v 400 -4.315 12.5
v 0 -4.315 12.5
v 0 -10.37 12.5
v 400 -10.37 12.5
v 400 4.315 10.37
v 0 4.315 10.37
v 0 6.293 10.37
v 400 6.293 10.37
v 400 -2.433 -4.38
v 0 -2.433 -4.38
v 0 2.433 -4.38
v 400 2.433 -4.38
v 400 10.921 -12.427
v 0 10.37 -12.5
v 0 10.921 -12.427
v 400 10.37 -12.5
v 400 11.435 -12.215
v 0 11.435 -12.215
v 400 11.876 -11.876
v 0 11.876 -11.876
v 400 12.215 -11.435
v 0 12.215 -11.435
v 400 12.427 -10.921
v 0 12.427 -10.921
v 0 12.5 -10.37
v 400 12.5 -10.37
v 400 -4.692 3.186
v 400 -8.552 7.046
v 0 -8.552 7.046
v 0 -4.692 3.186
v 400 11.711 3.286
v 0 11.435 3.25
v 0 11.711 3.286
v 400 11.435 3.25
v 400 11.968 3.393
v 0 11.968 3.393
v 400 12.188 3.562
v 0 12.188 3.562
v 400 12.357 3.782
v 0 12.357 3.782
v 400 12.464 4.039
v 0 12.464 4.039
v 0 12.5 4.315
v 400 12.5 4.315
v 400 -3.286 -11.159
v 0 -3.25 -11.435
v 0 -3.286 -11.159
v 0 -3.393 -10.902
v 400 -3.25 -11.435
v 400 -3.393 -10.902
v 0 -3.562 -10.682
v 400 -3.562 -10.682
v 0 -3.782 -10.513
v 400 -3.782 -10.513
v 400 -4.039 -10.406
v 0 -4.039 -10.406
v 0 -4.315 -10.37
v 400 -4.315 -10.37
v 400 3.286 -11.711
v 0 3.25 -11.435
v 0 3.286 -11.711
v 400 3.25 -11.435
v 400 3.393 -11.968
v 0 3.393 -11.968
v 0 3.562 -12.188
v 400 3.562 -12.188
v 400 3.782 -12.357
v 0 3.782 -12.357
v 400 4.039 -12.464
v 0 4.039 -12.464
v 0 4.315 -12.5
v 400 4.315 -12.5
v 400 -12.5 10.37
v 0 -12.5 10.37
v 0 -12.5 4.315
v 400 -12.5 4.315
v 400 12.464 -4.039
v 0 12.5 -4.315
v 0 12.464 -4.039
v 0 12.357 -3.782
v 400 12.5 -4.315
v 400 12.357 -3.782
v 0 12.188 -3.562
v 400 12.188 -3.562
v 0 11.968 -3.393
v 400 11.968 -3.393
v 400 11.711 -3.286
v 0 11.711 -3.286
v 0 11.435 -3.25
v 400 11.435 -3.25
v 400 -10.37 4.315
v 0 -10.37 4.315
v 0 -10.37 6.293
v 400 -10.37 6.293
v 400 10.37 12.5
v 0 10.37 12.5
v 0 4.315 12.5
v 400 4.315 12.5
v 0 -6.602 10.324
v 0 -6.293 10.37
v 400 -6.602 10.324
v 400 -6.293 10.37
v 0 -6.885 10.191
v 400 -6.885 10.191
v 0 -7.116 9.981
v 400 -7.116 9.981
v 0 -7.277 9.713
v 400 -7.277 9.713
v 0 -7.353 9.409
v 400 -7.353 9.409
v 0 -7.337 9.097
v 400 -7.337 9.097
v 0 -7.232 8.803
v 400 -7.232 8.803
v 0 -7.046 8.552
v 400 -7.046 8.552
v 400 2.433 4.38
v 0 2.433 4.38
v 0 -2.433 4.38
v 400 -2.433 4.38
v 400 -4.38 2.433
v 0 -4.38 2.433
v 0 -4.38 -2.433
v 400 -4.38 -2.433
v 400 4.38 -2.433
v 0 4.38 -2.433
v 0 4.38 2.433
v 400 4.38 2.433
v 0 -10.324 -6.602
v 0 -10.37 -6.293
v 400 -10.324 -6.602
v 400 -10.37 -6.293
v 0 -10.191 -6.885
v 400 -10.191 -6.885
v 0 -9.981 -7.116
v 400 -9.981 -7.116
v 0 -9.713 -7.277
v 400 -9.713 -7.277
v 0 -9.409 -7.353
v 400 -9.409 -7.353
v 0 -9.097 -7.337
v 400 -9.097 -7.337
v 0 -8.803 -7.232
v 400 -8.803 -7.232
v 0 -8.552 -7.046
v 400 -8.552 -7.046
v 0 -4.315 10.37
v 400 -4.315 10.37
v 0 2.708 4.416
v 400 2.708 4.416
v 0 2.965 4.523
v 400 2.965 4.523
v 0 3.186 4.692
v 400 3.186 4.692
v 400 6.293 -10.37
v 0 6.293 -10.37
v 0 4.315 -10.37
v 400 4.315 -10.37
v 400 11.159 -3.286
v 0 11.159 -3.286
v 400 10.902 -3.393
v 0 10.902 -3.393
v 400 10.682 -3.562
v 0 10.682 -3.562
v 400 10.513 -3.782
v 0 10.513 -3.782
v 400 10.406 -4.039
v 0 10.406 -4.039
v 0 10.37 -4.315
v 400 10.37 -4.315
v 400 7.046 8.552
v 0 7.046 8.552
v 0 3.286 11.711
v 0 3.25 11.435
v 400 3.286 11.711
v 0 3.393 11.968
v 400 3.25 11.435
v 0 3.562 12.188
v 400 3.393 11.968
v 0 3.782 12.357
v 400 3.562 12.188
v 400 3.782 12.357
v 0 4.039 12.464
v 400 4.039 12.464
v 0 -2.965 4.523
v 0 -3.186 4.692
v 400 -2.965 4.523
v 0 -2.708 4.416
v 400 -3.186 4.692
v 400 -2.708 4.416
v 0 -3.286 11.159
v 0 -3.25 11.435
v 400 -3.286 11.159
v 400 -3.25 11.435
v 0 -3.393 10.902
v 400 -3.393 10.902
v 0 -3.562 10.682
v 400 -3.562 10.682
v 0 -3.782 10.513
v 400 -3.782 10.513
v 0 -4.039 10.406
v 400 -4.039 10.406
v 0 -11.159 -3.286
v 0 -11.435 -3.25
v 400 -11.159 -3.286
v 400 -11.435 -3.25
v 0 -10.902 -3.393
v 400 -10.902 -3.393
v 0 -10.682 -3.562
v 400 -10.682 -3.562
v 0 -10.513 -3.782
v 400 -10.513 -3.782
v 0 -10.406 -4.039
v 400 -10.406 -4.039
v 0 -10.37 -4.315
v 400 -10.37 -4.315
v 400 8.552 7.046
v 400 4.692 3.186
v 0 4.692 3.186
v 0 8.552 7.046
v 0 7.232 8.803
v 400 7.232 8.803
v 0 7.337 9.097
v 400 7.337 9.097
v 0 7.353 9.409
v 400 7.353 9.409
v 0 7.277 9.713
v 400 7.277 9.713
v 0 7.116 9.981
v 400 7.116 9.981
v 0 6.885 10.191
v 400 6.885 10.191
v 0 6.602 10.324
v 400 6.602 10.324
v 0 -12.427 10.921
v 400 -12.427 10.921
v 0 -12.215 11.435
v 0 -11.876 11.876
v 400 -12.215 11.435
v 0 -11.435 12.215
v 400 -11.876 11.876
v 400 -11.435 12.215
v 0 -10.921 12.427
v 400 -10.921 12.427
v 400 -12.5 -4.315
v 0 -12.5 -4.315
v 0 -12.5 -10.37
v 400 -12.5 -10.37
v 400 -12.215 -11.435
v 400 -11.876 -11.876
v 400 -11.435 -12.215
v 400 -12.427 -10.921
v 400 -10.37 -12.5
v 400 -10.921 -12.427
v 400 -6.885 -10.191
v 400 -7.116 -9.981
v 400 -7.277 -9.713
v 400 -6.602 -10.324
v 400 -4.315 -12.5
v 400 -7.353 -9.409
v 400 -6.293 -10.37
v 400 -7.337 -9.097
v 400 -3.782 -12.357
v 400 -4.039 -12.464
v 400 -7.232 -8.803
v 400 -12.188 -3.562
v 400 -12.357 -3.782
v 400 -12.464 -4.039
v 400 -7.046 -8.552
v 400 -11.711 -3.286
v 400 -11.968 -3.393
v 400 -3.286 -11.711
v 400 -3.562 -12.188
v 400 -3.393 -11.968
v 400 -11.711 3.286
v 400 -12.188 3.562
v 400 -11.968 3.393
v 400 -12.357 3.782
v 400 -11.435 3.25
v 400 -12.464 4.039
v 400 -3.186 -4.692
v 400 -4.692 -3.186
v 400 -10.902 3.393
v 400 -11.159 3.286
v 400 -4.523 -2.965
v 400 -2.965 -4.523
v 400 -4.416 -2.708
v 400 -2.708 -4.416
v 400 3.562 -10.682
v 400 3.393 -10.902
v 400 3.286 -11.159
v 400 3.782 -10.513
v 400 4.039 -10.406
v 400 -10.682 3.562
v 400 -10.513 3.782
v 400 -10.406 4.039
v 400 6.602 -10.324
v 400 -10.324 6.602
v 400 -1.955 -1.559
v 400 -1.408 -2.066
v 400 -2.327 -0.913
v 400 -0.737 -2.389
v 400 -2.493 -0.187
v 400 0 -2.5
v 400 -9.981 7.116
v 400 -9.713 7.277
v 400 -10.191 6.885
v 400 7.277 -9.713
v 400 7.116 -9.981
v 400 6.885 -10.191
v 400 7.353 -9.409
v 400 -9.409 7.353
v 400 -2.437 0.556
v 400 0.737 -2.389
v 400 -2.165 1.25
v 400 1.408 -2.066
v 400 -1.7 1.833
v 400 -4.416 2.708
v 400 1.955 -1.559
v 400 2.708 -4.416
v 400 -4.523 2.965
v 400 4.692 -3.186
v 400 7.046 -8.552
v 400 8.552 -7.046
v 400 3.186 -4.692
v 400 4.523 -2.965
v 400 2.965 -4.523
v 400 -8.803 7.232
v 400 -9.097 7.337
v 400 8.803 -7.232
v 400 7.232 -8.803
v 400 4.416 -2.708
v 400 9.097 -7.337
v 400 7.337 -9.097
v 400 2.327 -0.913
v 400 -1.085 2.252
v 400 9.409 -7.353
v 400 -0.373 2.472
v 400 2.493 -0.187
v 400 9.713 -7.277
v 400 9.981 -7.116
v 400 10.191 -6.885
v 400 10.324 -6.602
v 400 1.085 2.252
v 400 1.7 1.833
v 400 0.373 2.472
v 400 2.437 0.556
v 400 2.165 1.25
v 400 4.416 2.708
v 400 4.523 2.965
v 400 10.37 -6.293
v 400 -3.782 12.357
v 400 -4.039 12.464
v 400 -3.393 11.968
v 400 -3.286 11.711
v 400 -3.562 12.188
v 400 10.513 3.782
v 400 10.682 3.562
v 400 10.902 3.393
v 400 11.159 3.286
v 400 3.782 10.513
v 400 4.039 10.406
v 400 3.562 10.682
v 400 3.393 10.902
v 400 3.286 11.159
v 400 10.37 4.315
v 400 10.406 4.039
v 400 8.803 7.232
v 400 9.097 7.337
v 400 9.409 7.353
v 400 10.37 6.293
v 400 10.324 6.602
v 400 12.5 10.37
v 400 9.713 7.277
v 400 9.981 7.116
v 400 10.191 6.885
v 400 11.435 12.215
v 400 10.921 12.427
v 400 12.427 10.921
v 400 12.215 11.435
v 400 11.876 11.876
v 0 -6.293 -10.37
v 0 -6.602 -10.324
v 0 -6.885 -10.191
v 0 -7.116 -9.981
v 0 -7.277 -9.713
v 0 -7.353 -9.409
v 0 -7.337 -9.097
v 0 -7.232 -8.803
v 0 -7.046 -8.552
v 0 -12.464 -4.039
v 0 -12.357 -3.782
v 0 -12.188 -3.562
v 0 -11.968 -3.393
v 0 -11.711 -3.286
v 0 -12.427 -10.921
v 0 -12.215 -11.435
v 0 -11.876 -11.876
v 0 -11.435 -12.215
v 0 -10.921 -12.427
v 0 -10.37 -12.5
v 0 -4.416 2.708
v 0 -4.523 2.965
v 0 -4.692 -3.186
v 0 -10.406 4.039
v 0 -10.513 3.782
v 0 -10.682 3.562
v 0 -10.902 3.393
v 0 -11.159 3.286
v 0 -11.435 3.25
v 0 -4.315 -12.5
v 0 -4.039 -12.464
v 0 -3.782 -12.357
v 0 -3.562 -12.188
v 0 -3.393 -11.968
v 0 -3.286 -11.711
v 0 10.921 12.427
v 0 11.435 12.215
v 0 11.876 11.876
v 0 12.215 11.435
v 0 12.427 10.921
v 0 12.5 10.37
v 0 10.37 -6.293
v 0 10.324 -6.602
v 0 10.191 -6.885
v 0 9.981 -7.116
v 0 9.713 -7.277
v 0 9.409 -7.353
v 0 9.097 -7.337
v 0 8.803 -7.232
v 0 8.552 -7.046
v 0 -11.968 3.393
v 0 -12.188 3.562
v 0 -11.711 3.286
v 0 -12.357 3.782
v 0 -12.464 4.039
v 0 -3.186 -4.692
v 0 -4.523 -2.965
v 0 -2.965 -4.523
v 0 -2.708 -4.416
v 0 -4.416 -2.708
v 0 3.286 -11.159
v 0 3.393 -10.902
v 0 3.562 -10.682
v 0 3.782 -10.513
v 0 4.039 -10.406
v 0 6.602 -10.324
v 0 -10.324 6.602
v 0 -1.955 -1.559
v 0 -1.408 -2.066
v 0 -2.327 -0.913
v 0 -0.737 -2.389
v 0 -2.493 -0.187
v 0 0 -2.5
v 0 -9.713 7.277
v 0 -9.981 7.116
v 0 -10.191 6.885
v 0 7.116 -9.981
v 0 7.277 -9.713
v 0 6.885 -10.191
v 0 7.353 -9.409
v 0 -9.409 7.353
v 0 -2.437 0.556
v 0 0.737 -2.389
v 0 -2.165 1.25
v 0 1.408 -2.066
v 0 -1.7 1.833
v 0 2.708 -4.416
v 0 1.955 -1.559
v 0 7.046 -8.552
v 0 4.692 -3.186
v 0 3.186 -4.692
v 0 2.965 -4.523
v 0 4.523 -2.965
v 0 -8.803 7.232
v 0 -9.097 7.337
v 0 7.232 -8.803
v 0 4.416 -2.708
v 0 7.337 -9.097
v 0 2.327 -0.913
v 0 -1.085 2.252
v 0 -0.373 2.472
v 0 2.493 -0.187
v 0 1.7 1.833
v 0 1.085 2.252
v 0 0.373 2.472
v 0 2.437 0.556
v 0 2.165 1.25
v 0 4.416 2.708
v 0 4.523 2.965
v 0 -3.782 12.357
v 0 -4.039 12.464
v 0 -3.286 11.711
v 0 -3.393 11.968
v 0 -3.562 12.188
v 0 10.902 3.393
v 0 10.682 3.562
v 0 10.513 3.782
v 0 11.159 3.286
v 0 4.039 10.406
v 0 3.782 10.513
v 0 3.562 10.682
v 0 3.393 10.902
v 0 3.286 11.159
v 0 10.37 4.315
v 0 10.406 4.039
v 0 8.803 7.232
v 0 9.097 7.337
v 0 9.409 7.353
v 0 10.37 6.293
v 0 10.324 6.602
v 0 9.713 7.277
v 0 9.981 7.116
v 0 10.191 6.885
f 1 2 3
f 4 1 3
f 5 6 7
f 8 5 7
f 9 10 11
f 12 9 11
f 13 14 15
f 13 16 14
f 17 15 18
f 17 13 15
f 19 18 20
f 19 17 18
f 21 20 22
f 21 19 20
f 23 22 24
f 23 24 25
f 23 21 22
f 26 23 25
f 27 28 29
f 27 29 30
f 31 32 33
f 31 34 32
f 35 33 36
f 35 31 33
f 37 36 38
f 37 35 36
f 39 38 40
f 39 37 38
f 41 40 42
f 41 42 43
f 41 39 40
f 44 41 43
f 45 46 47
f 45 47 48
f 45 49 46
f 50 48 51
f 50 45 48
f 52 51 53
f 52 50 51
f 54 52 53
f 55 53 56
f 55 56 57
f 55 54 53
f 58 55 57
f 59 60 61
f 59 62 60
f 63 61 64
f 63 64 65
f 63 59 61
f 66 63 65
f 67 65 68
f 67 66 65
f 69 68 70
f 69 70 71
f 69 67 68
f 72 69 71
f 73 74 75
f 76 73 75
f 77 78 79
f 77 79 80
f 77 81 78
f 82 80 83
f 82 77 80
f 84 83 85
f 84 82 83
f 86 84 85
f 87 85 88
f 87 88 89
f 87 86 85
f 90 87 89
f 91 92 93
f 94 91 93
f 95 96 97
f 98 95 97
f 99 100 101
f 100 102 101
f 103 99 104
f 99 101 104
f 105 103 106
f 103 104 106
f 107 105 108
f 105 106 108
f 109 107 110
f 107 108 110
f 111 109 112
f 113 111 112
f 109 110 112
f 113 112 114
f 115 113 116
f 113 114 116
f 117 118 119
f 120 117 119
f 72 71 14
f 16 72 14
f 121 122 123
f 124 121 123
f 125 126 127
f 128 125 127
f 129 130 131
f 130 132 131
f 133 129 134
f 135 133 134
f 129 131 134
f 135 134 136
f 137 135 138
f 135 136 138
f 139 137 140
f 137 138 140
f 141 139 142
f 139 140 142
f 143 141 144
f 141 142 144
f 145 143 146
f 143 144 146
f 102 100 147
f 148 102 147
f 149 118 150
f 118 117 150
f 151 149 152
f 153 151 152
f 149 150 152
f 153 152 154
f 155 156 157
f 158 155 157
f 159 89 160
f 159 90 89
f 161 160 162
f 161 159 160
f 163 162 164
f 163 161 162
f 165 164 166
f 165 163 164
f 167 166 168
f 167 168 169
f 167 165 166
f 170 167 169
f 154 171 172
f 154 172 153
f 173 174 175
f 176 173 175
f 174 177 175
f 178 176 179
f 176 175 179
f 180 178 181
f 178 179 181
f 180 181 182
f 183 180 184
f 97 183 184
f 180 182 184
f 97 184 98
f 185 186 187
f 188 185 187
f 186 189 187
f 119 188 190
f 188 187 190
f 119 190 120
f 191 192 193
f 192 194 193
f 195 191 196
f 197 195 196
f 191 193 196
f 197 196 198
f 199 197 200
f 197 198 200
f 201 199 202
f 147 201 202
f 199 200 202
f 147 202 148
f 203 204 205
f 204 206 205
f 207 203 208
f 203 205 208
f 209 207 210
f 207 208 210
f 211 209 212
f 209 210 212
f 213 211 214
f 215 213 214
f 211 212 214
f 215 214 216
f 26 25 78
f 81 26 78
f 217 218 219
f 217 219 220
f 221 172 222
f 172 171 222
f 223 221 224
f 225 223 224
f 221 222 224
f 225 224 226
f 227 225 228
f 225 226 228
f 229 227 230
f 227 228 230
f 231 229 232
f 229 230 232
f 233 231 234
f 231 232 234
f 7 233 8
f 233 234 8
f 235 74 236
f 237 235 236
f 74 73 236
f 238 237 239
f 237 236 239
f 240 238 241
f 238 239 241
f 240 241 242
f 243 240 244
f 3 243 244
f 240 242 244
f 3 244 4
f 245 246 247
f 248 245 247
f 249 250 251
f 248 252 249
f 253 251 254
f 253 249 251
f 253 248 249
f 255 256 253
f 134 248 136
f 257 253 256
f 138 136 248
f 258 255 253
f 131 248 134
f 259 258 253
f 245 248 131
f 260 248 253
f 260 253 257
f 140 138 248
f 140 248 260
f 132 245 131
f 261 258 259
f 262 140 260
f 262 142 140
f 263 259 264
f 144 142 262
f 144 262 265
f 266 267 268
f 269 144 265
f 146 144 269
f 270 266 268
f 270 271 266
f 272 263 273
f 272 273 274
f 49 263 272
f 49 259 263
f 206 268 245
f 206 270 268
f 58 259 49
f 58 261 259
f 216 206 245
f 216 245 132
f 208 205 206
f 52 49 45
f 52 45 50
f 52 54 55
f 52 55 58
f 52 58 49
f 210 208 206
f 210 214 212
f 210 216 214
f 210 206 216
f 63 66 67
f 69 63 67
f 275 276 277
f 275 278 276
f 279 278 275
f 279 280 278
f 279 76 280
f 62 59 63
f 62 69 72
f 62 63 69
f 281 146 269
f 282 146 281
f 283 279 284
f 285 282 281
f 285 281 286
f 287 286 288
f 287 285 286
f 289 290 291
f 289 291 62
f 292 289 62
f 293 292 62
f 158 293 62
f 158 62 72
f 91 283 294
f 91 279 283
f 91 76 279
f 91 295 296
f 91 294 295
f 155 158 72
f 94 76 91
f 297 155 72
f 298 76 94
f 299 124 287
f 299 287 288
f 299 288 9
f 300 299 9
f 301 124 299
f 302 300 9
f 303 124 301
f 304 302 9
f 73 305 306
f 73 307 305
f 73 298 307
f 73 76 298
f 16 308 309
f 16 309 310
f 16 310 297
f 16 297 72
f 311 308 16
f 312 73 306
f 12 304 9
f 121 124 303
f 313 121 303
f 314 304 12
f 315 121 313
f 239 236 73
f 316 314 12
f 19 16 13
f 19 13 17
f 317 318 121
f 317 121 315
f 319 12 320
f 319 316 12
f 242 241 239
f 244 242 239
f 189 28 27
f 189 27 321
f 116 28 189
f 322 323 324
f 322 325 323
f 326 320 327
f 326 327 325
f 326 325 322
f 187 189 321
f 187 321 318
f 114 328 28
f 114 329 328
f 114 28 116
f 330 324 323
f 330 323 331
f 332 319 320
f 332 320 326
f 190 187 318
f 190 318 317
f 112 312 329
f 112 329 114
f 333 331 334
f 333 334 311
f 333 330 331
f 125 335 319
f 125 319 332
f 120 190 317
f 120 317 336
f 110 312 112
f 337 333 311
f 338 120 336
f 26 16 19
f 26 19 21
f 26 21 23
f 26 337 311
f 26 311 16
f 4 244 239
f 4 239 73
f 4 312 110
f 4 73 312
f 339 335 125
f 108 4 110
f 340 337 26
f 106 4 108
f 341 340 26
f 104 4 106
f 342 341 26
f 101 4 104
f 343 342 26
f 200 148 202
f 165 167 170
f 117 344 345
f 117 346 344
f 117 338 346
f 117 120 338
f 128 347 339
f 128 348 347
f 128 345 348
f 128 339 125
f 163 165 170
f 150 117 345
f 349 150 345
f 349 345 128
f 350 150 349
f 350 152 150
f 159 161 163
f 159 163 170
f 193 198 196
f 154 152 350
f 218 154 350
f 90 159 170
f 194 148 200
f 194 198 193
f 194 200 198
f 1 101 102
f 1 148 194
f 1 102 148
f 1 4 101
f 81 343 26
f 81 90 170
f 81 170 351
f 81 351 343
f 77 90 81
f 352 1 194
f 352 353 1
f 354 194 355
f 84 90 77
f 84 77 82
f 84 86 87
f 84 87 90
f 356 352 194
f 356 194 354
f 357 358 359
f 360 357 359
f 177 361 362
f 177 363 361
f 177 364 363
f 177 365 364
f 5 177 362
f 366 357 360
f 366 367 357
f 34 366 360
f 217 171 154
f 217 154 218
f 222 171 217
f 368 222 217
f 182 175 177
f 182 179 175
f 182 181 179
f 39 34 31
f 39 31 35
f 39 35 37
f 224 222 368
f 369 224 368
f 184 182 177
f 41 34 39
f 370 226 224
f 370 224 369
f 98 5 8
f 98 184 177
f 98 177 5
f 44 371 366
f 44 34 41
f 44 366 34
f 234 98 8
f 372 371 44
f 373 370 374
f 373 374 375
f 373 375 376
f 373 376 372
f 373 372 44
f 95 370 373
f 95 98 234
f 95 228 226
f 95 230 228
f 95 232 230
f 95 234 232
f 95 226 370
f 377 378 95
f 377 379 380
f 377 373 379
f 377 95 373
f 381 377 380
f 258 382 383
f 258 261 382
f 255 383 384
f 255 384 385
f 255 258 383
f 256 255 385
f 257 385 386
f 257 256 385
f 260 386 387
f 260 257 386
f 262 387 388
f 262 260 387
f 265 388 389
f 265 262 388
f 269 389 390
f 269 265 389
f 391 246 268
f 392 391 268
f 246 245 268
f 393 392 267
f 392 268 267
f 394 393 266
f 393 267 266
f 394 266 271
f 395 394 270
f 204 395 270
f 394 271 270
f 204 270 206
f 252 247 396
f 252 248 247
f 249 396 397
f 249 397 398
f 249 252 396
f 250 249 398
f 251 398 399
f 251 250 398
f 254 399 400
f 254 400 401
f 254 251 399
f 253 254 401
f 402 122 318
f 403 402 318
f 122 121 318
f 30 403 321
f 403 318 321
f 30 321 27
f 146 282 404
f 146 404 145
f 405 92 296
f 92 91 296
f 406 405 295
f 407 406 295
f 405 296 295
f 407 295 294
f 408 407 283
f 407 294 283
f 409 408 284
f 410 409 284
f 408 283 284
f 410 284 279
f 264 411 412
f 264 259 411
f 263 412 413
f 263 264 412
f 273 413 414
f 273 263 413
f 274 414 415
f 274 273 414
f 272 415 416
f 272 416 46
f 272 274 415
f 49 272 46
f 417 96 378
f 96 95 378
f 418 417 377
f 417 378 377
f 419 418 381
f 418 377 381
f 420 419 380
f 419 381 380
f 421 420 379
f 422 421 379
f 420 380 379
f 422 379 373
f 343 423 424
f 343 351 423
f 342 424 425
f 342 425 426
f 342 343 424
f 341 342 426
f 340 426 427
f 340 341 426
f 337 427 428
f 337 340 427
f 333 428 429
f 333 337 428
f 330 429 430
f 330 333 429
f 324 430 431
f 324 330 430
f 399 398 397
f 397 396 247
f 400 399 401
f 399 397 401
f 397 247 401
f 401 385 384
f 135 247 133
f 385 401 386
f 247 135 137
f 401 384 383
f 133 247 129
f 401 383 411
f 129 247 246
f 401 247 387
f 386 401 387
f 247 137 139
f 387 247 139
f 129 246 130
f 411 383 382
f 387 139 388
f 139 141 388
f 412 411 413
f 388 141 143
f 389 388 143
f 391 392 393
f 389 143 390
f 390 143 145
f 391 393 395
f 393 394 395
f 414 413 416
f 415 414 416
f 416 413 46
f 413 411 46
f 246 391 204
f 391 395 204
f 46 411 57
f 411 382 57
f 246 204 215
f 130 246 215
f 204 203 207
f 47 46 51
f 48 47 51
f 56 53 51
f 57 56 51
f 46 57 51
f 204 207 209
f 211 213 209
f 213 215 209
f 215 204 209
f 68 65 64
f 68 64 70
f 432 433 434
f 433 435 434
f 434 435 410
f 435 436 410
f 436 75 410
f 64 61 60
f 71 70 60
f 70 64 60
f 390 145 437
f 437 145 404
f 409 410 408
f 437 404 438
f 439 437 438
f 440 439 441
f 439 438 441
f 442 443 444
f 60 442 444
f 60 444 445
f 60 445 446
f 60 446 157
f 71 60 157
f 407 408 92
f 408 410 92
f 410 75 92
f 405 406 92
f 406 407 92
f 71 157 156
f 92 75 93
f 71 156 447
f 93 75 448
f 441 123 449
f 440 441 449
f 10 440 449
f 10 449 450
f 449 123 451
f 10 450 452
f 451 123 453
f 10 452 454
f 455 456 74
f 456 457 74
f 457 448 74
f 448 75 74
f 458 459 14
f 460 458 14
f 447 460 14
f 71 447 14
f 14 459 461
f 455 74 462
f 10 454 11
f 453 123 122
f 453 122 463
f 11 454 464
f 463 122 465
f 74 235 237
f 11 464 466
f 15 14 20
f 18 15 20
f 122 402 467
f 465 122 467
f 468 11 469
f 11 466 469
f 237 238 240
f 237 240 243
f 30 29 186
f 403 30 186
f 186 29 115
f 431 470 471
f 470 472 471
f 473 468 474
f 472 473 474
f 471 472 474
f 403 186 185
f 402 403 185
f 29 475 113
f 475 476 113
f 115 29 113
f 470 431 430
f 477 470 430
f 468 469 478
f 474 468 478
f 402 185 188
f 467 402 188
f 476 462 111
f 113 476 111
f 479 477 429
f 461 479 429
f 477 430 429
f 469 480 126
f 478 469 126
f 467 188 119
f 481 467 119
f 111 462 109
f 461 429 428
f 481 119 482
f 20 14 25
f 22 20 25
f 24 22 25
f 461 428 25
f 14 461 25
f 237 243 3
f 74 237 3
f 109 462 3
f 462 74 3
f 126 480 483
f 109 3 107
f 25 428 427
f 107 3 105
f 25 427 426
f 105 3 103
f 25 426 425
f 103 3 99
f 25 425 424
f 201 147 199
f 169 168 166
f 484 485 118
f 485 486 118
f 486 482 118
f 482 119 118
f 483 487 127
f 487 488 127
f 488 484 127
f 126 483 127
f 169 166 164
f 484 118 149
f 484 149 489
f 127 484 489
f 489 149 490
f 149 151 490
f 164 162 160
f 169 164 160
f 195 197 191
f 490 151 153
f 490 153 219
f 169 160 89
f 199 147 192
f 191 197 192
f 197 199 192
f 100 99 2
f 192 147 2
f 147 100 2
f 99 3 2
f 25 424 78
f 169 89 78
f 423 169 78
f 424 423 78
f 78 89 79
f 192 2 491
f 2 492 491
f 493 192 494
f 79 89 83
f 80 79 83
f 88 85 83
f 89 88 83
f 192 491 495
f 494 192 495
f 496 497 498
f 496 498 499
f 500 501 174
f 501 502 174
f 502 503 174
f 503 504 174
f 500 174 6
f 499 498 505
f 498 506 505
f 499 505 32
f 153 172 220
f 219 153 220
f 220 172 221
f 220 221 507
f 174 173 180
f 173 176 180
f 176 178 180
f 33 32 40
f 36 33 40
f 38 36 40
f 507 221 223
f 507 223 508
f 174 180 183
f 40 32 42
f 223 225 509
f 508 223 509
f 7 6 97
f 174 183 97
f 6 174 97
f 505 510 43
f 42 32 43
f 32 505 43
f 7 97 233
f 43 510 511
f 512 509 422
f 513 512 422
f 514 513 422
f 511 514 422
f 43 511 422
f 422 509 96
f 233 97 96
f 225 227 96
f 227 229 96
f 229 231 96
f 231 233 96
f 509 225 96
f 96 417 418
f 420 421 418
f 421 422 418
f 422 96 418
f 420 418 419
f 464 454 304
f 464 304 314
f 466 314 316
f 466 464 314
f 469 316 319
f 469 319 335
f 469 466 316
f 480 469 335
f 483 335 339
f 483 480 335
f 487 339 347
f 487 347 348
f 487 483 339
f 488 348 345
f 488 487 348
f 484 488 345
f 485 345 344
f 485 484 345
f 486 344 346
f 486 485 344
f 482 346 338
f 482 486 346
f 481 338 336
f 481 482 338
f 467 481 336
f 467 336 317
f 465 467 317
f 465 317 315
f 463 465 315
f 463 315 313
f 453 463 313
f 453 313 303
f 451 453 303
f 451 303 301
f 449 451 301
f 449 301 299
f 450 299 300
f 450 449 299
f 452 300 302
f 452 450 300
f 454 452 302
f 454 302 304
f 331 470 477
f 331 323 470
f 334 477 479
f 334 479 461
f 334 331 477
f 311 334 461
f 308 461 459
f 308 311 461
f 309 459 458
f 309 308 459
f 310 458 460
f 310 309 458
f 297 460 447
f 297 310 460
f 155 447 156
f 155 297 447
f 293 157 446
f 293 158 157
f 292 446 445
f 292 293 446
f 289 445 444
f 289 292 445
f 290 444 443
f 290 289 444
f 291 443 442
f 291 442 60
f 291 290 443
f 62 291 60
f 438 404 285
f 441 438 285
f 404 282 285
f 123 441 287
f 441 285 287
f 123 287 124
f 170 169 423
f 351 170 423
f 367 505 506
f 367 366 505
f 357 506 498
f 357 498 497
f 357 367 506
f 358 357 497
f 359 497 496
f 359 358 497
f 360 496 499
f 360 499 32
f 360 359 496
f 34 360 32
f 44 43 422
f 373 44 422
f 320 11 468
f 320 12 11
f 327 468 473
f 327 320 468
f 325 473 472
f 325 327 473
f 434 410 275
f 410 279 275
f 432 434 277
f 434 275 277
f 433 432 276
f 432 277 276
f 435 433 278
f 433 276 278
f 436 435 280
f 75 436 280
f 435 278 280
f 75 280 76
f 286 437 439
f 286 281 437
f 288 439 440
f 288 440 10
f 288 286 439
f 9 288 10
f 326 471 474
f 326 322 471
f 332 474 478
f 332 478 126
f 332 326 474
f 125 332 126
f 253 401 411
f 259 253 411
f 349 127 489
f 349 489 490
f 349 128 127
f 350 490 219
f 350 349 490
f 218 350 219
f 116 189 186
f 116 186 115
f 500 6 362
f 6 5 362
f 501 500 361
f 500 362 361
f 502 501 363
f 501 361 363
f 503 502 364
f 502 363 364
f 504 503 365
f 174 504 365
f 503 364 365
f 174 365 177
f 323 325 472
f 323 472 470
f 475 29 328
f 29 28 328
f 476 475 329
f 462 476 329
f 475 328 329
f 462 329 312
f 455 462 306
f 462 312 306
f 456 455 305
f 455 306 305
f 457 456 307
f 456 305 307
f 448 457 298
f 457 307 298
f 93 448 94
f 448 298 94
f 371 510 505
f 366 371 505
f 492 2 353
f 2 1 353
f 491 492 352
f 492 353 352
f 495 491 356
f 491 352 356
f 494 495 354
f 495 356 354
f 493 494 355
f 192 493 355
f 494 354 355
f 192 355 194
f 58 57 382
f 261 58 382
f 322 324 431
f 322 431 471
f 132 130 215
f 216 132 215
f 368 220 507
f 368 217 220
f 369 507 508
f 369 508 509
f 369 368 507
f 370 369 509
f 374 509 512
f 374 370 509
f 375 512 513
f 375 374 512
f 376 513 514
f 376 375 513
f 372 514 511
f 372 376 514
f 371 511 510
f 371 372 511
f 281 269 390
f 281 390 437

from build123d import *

# Parameters (mm, degrees)
SKETCH1_R           = 2.5
BOSS_EXTRUDE1_DEPTH = 400
FILLET1_R           = 1.065
FILLET2_R           = 2.13


with BuildPart() as part:
    # Sketch1 → Boss-Extrude1 (new body)
    with BuildSketch(Plane.YZ):
        Polygon((-12.5, -3.25), (-12.5, -12.5), (-3.25, -12.5), (-3.25, -10.37), (-8.863862556, -10.37), (-2.873862556, -4.38), (2.873862556, -4.38), (8.863862556, -10.37), (3.25, -10.37), (3.25, -12.5), (12.5, -12.5), (12.5, -3.25), (10.37, -3.25), (10.37, -8.863862556), (4.38, -2.873862556), (4.38, 2.873862556), (10.37, 8.863862556), (10.37, 3.25), (12.5, 3.25), (12.5, 12.5), (3.25, 12.5), (3.25, 10.37), (8.863862556, 10.37), (2.873862556, 4.38), (-2.873862556, 4.38), (-8.863862556, 10.37), (-3.25, 10.37), (-3.25, 12.5), (-12.5, 12.5), (-12.5, 3.25), (-10.37, 3.25), (-10.37, 8.863862556), (-4.38, 2.873862556), (-4.38, -2.873862556), (-10.37, -8.863862556), (-10.37, -3.25), align=None)
        with Locations(Location((0, 0, 0), (0, 0, 270))):
            Circle(SKETCH1_R, mode=Mode.SUBTRACT)
    extrude(amount=BOSS_EXTRUDE1_DEPTH)

    # Fillet1
    fillet1_edges = [part.edges().sort_by_distance(p)[0] for p in [
        (200, -10.37, -8.863862556),
        (200, 2.873862556, -4.38),
        (200, -2.873862556, -4.38),
        (200, -4.38, 2.873862556),
        (200, -4.38, -2.873862556),
        (200, -2.873862556, 4.38),
        (200, 2.873862556, 4.38),
        (200, 4.38, 2.873862556),
        (200, 4.38, -2.873862556),
        (200, -8.863862556, -10.37),
        (200, 8.863862556, -10.37),
        (200, 10.37, -8.863862556),
        (200, -10.37, 8.863862556),
        (200, -8.863862556, 10.37),
        (200, 10.37, 8.863862556),
        (200, 8.863862556, 10.37),
        (200, 12.5, 3.25),
        (200, -3.25, -12.5),
        (200, -10.37, 3.25),
        (200, 10.37, 3.25),
        (200, -10.37, -3.25),
        (200, -12.5, -3.25),
        (200, -12.5, 3.25),
        (200, 3.25, -10.37),
        (200, -3.25, -10.37),
        (200, 3.25, -12.5),
        (200, 10.37, -3.25),
        (200, 12.5, -3.25),
        (200, 3.25, 12.5),
        (200, 3.25, 10.37),
        (200, -3.25, 10.37),
        (200, -3.25, 12.5),
    ]]
    fillet(fillet1_edges, radius=FILLET1_R - 0.0001)  # a hair under: the kernel refuses the full size

    # Fillet2
    fillet2_edges = [part.edges().sort_by_distance(p)[0] for p in [
        (200, -12.5, 12.5),
        (200, 12.5, 12.5),
        (200, 12.5, -12.5),
        (200, -12.5, -12.5),
    ]]
    fillet(fillet2_edges, radius=FILLET2_R)


solid = part.part
